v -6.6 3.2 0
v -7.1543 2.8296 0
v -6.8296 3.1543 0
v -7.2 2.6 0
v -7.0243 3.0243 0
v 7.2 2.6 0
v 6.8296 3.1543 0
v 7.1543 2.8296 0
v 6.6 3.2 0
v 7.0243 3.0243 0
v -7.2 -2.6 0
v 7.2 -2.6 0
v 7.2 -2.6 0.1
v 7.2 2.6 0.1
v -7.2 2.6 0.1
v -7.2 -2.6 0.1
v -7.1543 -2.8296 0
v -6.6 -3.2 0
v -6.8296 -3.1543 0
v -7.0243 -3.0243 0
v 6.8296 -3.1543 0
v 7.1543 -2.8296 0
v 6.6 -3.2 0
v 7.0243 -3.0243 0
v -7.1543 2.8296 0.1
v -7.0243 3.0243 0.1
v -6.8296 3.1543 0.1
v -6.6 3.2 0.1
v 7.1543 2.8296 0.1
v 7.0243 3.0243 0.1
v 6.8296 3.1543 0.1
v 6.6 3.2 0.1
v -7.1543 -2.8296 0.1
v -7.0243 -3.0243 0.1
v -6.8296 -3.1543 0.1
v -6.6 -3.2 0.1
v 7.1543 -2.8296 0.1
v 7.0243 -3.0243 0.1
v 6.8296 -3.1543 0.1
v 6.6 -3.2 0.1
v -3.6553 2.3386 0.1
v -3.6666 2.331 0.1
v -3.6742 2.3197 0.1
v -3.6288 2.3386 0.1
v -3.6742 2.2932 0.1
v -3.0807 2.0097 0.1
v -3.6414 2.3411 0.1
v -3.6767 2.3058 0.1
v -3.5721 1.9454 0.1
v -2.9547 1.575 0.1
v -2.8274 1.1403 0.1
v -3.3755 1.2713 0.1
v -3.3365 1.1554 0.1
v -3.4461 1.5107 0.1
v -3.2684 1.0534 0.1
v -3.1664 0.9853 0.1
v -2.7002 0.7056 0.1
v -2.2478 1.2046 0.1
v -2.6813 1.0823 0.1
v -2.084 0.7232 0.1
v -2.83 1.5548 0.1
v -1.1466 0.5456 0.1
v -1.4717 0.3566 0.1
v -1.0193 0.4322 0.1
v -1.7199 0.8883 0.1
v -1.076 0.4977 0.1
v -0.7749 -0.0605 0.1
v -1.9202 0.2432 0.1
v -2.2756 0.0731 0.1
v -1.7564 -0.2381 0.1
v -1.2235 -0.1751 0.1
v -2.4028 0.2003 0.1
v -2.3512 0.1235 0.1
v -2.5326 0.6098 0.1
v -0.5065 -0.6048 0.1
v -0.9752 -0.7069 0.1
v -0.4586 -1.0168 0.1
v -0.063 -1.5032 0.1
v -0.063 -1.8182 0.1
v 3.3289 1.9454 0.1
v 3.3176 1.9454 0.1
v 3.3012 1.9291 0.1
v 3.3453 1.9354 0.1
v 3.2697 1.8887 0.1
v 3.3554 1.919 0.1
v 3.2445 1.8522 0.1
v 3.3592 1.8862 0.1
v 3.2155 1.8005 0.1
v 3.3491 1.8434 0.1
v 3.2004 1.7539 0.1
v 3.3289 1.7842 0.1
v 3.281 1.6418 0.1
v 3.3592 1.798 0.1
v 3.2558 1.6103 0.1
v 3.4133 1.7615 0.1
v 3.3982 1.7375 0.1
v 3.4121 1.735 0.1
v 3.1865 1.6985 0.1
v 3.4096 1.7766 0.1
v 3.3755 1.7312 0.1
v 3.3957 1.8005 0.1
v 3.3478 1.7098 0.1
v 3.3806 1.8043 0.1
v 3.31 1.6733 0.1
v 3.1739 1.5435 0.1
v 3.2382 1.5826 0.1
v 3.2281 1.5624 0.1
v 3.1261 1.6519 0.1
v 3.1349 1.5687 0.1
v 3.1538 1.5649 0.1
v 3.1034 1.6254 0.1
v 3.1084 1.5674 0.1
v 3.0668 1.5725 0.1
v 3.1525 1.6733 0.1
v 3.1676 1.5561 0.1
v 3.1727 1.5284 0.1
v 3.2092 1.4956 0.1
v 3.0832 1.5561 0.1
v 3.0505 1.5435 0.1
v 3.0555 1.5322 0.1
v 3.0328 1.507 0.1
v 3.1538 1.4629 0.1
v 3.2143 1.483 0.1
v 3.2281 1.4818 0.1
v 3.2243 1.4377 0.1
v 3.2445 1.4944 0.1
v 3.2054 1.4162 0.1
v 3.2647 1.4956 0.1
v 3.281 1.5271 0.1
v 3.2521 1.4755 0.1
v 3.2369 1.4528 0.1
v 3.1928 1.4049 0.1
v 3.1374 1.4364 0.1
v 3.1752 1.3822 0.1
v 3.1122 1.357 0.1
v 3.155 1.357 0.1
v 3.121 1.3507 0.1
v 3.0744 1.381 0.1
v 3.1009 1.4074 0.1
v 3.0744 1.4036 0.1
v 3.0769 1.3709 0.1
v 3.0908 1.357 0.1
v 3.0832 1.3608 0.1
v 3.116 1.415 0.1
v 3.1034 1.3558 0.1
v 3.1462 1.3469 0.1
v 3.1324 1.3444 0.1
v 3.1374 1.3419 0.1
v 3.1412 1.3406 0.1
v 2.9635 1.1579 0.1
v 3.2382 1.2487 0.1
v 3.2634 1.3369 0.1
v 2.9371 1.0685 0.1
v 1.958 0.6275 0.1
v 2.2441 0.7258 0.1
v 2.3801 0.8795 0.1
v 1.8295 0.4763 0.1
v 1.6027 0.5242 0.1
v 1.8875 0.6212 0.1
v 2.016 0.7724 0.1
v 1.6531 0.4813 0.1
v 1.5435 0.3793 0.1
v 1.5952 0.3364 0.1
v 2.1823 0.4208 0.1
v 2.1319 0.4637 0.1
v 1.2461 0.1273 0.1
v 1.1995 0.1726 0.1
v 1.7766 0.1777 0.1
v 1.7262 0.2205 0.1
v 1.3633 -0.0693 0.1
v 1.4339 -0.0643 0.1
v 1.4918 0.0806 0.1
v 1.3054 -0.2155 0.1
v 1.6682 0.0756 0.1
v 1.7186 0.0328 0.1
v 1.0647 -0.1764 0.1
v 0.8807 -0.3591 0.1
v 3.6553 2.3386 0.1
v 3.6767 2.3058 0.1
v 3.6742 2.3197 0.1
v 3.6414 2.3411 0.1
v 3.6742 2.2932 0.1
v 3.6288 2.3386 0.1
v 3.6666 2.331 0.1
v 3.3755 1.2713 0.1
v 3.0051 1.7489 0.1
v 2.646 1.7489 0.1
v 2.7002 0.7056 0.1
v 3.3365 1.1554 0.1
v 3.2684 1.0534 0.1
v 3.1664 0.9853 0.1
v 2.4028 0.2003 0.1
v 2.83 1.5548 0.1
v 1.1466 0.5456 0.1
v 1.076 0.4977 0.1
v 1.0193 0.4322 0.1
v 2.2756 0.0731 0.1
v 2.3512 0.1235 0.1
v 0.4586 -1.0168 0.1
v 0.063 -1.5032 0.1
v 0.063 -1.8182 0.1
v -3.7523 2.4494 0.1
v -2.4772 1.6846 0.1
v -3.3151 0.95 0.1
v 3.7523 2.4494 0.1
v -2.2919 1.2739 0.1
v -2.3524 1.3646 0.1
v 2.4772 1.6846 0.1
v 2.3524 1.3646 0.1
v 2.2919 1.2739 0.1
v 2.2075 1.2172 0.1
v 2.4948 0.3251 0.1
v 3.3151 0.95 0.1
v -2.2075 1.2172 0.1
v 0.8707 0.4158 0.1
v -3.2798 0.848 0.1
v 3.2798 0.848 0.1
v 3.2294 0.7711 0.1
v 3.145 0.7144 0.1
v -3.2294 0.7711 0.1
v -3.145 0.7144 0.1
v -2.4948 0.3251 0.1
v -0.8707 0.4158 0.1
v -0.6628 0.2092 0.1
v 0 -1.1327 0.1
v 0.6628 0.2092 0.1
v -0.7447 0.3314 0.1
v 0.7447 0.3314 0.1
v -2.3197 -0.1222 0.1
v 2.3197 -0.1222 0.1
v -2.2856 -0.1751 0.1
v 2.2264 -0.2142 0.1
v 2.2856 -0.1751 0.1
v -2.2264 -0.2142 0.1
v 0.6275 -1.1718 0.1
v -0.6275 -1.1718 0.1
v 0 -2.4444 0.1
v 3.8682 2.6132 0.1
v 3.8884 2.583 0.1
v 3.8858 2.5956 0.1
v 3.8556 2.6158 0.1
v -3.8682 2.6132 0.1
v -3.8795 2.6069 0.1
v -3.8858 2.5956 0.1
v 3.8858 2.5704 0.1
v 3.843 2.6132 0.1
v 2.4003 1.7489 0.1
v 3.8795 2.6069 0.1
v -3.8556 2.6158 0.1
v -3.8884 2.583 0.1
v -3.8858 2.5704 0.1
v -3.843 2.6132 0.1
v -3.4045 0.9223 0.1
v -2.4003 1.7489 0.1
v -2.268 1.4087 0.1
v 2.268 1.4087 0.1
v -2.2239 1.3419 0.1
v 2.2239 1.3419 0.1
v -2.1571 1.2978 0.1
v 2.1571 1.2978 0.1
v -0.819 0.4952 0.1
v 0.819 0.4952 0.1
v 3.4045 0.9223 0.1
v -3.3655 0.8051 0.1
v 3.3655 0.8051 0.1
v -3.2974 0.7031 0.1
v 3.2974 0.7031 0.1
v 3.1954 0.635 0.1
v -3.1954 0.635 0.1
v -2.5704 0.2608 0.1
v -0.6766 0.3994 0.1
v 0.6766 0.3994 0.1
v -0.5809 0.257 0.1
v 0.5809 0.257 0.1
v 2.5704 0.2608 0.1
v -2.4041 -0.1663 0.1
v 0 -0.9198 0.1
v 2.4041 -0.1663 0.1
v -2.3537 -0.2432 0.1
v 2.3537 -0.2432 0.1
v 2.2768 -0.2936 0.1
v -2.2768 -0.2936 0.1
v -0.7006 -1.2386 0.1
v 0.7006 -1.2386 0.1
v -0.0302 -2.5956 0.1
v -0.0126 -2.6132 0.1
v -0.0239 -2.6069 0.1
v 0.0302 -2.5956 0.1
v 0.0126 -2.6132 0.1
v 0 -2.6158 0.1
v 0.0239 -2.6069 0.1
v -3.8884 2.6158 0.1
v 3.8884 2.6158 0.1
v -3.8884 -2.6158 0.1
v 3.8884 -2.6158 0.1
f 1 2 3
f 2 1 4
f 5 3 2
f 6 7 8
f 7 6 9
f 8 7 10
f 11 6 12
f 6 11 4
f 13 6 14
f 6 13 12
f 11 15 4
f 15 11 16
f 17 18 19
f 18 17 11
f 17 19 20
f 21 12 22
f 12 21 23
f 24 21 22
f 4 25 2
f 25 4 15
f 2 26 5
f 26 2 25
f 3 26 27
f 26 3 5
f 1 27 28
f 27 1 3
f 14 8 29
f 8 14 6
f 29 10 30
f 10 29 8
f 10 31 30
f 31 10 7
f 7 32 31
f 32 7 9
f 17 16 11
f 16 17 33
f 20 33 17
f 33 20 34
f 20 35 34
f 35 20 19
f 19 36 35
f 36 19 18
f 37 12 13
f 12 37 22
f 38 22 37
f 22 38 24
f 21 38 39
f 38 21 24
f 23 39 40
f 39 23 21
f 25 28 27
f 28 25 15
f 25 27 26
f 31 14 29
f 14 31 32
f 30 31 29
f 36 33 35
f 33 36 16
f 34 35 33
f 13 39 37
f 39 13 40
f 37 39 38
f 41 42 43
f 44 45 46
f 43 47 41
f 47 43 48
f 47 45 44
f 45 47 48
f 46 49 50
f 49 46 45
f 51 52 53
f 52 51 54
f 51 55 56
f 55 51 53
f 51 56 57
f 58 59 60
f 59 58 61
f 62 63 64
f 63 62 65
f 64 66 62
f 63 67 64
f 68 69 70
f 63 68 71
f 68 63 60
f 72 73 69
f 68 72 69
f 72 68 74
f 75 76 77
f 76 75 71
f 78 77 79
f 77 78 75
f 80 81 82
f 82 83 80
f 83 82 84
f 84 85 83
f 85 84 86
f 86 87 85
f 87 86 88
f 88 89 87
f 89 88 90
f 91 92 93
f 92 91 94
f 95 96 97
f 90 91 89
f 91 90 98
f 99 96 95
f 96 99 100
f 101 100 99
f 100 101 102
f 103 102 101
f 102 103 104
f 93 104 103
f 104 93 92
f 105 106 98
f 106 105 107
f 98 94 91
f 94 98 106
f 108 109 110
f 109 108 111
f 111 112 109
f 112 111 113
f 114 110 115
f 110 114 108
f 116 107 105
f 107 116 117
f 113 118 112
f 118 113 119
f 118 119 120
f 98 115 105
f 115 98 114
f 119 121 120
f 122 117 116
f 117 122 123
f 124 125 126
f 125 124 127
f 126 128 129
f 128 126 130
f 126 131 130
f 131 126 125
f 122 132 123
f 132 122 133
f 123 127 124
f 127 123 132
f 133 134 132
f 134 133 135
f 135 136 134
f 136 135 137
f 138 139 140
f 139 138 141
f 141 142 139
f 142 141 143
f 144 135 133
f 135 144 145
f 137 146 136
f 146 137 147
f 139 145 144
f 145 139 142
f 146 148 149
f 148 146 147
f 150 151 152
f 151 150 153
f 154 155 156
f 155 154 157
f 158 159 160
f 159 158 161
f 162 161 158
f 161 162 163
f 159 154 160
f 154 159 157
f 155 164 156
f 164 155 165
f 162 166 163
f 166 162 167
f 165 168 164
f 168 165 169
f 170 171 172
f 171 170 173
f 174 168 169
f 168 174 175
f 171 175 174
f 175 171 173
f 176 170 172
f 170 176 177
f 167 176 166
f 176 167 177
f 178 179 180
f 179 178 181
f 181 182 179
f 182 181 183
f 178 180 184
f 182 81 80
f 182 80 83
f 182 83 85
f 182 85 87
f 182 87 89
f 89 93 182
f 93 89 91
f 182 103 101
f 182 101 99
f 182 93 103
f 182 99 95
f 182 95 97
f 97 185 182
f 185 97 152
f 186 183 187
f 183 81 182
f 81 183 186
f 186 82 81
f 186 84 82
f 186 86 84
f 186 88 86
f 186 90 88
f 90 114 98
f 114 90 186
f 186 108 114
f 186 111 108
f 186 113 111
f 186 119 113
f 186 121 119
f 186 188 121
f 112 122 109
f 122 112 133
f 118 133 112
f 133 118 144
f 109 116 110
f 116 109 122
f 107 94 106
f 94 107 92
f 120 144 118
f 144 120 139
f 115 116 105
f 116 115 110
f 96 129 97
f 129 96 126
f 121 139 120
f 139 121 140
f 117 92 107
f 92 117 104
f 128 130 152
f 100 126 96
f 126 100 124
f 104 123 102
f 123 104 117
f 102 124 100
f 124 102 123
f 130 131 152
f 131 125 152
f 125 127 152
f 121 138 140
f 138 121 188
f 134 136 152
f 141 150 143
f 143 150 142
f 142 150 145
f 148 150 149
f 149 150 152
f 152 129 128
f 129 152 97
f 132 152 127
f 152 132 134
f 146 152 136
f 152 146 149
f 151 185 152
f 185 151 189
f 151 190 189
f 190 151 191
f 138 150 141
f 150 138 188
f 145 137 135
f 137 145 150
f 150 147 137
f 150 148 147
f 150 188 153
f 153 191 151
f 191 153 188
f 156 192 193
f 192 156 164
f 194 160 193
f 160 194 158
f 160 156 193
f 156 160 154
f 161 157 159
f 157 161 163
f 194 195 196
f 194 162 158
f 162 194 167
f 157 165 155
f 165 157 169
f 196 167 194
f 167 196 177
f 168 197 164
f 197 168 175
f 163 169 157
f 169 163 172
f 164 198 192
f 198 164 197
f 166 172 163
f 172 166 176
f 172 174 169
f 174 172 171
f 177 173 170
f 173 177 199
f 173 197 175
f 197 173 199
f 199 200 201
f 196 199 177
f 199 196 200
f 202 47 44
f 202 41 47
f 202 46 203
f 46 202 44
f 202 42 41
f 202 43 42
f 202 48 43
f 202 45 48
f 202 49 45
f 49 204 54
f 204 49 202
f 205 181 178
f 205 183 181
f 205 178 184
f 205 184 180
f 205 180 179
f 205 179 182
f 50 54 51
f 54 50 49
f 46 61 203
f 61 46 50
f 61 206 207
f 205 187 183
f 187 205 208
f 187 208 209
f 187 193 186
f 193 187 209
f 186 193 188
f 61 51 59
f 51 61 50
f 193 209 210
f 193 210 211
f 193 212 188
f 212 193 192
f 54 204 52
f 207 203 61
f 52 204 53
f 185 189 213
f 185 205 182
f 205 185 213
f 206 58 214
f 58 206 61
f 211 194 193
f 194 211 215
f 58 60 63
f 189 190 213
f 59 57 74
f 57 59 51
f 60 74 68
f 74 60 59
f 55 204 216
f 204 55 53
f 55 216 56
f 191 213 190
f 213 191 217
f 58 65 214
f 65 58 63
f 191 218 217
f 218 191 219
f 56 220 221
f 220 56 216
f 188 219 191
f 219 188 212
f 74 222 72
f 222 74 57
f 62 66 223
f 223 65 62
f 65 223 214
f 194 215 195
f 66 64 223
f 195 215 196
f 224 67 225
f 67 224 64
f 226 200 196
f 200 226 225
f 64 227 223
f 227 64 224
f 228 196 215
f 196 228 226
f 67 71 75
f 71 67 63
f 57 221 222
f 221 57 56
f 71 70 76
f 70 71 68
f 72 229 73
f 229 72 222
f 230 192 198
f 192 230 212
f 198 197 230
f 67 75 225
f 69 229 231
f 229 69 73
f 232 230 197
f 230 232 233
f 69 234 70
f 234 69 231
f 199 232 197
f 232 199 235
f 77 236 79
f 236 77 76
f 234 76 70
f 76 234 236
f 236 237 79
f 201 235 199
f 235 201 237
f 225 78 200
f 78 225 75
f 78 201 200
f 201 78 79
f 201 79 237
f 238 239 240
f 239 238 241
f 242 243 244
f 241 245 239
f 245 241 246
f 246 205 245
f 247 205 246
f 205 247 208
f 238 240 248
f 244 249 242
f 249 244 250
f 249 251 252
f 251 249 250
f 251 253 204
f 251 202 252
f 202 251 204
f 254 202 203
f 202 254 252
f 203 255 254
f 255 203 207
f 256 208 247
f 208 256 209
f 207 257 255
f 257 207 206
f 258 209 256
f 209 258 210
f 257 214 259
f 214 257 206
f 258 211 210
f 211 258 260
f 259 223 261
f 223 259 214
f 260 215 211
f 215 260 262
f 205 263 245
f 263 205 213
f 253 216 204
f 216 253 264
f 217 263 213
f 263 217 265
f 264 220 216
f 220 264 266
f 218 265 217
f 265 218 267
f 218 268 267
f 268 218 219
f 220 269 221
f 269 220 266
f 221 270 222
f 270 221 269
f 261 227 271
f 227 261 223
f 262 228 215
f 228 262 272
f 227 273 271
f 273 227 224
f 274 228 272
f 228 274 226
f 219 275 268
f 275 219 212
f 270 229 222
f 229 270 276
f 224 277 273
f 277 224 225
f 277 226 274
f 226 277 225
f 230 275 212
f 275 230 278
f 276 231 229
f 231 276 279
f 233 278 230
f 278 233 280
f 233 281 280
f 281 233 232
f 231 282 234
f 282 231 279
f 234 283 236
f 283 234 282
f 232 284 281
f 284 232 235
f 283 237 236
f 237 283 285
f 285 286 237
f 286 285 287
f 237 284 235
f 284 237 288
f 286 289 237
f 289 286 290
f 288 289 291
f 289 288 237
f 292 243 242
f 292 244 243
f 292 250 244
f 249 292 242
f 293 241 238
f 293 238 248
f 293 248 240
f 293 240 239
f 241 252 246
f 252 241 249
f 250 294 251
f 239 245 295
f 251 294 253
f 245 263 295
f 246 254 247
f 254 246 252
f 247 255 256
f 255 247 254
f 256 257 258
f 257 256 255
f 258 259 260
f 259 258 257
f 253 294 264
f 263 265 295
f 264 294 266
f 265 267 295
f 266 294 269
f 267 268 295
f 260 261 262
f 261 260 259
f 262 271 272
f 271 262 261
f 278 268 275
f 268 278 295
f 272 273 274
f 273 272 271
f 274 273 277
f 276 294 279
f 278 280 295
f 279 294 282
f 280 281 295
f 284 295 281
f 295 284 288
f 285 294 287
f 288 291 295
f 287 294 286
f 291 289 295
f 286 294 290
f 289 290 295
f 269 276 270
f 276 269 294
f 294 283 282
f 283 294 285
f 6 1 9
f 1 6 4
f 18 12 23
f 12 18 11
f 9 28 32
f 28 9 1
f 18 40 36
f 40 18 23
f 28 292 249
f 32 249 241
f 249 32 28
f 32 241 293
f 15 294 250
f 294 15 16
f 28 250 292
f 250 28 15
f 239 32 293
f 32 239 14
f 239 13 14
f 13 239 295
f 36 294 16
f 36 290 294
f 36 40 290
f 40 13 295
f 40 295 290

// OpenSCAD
// file: ../p/box3u12.scad
use <../lib.scad>
function ldraw_lib__box3u12() = [
// 0 Box with 3 Parallel Faces without Any Edges
// 0 Name: box3u12.dat
// 0 Author: J.C. Tchang [tchang]
// 0 !LDRAW_ORG Primitive UPDATE 2014-02
// 0 !LICENSE Licensed under CC BY 4.0 : see CAreadme.txt
// 
// 0 BFC CERTIFY CCW
  [0,"BFC","CERTIFY"],
  [0,"BFC","CCW"],
// 
// 0 !HISTORY 2014-12-23 [PTadmin] Official Update 2014-02
// 
// 
// 4 16 -1 1 1 1 1 1 1 1 -1 -1 1 -1
  [4,16,-1,1,1,1,1,1,1,1,-1,-1,1,-1],
// 4 16 -1 1 1 -1 0 1 1 0 1 1 1 1
  [4,16,-1,1,1,-1,0,1,1,0,1,1,1,1],
// 4 16 1 1 -1 1 0 -1 -1 0 -1 -1 1 -1
  [4,16,1,1,-1,1,0,-1,-1,0,-1,-1,1,-1],
];
module ldraw_lib__box3u12(step=0, col=false, unit=2/5, alt=false, line=0.2, solid=!$preview)
    makepoly(ldraw_lib__box3u12(), step=step, col=col, unit=unit, alt=alt, line=line, solid=solid);
ldraw_lib__box3u12(line=0.2);
// file: ../p/1-4cyli.scad
use <../lib.scad>
function ldraw_lib__1_4cyli() = [
// 0 Cylinder 0.25
// 0 Name: 1-4cyli.dat
// 0 Author: James Jessiman
// 0 !LDRAW_ORG Primitive UPDATE 2012-01
// 0 !LICENSE Licensed under CC BY 4.0 : see CAreadme.txt
// 
// 0 BFC CERTIFY CCW
  [0,"BFC","CERTIFY"],
  [0,"BFC","CCW"],
// 
// 0 !HISTORY 2002-03-23 [sbliss] Added BFC statement.
// 0 !HISTORY 2002-04-25 [PTadmin] Official Update 2002-02
// 0 !HISTORY 2007-06-22 [PTadmin] Header formatted for Contributor Agreement
// 0 !HISTORY 2008-07-01 [PTadmin] Official Update 2008-01
// 0 !HISTORY 2012-02-16 [Philo] Changed to CCW
// 0 !HISTORY 2012-03-30 [PTadmin] Official Update 2012-01
// 
// 
// 4 16 1 1 0 0.9239 1 0.3827 0.9239 0 0.3827 1 0 0
  [4,16,1,1,0,0.9239,1,0.3827,0.9239,0,0.3827,1,0,0],
// 5 24 1 0 0 1 1 0 0.9239 0 0.3827 1 0 -1
  [5,24,1,0,0,1,1,0,0.9239,0,0.3827,1,0,-1],
// 4 16 0.9239 1 0.3827 0.7071 1 0.7071 0.7071 0 0.7071 0.9239 0 0.3827
  [4,16,0.9239,1,0.3827,0.7071,1,0.7071,0.7071,0,0.7071,0.9239,0,0.3827],
// 5 24 0.9239 0 0.3827 0.9239 1 0.3827 0.7071 0 0.7071 1 0 0
  [5,24,0.9239,0,0.3827,0.9239,1,0.3827,0.7071,0,0.7071,1,0,0],
// 4 16 0.7071 1 0.7071 0.3827 1 0.9239 0.3827 0 0.9239 0.7071 0 0.7071
  [4,16,0.7071,1,0.7071,0.3827,1,0.9239,0.3827,0,0.9239,0.7071,0,0.7071],
// 5 24 0.7071 0 0.7071 0.7071 1 0.7071 0.3827 0 0.9239 0.9239 0 0.3827
  [5,24,0.7071,0,0.7071,0.7071,1,0.7071,0.3827,0,0.9239,0.9239,0,0.3827],
// 4 16 0.3827 1 0.9239 0 1 1 0 0 1 0.3827 0 0.9239
  [4,16,0.3827,1,0.9239,0,1,1,0,0,1,0.3827,0,0.9239],
// 5 24 0.3827 0 0.9239 0.3827 1 0.9239 0 0 1 0.7071 0 0.7071
  [5,24,0.3827,0,0.9239,0.3827,1,0.9239,0,0,1,0.7071,0,0.7071],
// 5 24 0 0 1 0 1 1 0.3827 0 0.9239 -1 0 1
  [5,24,0,0,1,0,1,1,0.3827,0,0.9239,-1,0,1],
];
module ldraw_lib__1_4cyli(step=0, col=false, unit=2/5, alt=false, line=0.2, solid=!$preview)
    makepoly(ldraw_lib__1_4cyli(), step=step, col=col, unit=unit, alt=alt, line=line, solid=solid);
ldraw_lib__1_4cyli(line=0.2);
// file: ../p/1-4chrd.scad
use <../lib.scad>
function ldraw_lib__1_4chrd() = [
// 0 Chord 0.25
// 0 Name: 1-4chrd.dat
// 0 Author: Tony Hafner [hafhead]
// 0 !LDRAW_ORG Primitive UPDATE 2012-02
// 0 !LICENSE Licensed under CC BY 2.0 and CC BY 4.0 : see CAreadme.txt
// 
// 0 BFC CERTIFY CCW
  [0,"BFC","CERTIFY"],
  [0,"BFC","CCW"],
// 
// 0 !HISTORY 2004-04-22 [PTadmin] Official Update 2004-02
// 0 !HISTORY 2007-10-09 [PTadmin] Header formatted for Contributor Agreement
// 0 !HISTORY 2008-07-01 [PTadmin] Official Update 2008-01
// 0 !HISTORY 2012-08-02 [MMR1988] Re-creation with PrimGen2 and Rectifier
// 0 !HISTORY 2012-08-09 [PTadmin] Official Update 2012-02
// 
// 
// 4 16 0.9239 0 0.3827 0.3827 0 0.9239 0 0 1 1 0 0
  [4,16,0.9239,0,0.3827,0.3827,0,0.9239,0,0,1,1,0,0],
// 3 16 0.7071 0 0.7071 0.3827 0 0.9239 0.9239 0 0.3827
  [3,16,0.7071,0,0.7071,0.3827,0,0.9239,0.9239,0,0.3827],
];
module ldraw_lib__1_4chrd(step=0, col=false, unit=2/5, alt=false, line=0.2, solid=!$preview)
    makepoly(ldraw_lib__1_4chrd(), step=step, col=col, unit=unit, alt=alt, line=line, solid=solid);
ldraw_lib__1_4chrd(line=0.2);
// main file
use <../lib.scad>
use <../p/1-4chrd.scad>
use <../p/1-4cyli.scad>
use <../p/box3u12.scad>
use <s/logochevl02.scad>
function ldraw_lib__6142622e() = [
// 0 Sticker  0.8 x  1.8 with Chevrolet Corvette Z06-C7 Logo on Yellow Background
// 0 Name: 6142622e.dat
// 0 Author: Massimo Maso [Sirio]
// 0 !LDRAW_ORG Part UPDATE 2022-03
// 0 !LICENSE Licensed under CC BY 4.0 : see CAreadme.txt
// 
// 0 BFC CERTIFY CCW
  [0,"BFC","CERTIFY"],
  [0,"BFC","CCW"],
// 
// 0 !KEYWORDS Set 75870, Speed Champions
// 
// 0 !HISTORY 2022-05-07 [PTadmin] Official Update 2022-03
// 
// 
// 0 // Primitives
// 1 16 -16.5 0 6.5 -1.5 0 0 0 -1 0 0 0 1.5 1-4chrd.dat
  [1,16,-16.5,0,6.5,-1.5,0,0,0,-1,0,0,0,1.5, ldraw_lib__1_4chrd()],
// 1 16 16.5 0 6.5 1.5 0 0 0 -1 0 0 0 1.5 1-4chrd.dat
  [1,16,16.5,0,6.5,1.5,0,0,0,-1,0,0,0,1.5, ldraw_lib__1_4chrd()],
// 1 16 0 -.25 0 0 0 18 0 .25 0 -6.5 0 0 box3u12.dat
  [1,16,0,-.25,0,0,0,18,0,.25,0,-6.5,0,0, ldraw_lib__box3u12()],
// 1 16 -16.5 0 -6.5 -1.5 0 0 0 -1 0 0 0 -1.5 1-4chrd.dat
  [1,16,-16.5,0,-6.5,-1.5,0,0,0,-1,0,0,0,-1.5, ldraw_lib__1_4chrd()],
// 1 16 16.5 0 -6.5 1.5 0 0 0 -1 0 0 0 -1.5 1-4chrd.dat
  [1,16,16.5,0,-6.5,1.5,0,0,0,-1,0,0,0,-1.5, ldraw_lib__1_4chrd()],
// 1 16 -16.5 0 6.5 -1.5 0 0 0 -.25 0 0 0 1.5 1-4cyli.dat
  [1,16,-16.5,0,6.5,-1.5,0,0,0,-.25,0,0,0,1.5, ldraw_lib__1_4cyli()],
// 1 16 16.5 0 6.5 1.5 0 0 0 -.25 0 0 0 1.5 1-4cyli.dat
  [1,16,16.5,0,6.5,1.5,0,0,0,-.25,0,0,0,1.5, ldraw_lib__1_4cyli()],
// 1 16 -16.5 0 -6.5 -1.5 0 0 0 -.25 0 0 0 -1.5 1-4cyli.dat
  [1,16,-16.5,0,-6.5,-1.5,0,0,0,-.25,0,0,0,-1.5, ldraw_lib__1_4cyli()],
// 1 16 16.5 0 -6.5 1.5 0 0 0 -.25 0 0 0 -1.5 1-4cyli.dat
  [1,16,16.5,0,-6.5,1.5,0,0,0,-.25,0,0,0,-1.5, ldraw_lib__1_4cyli()],
// 1 14 -16.5 -.25 6.5 -1.5 0 0 0 1 0 0 0 1.5 1-4chrd.dat
  [1,14,-16.5,-.25,6.5,-1.5,0,0,0,1,0,0,0,1.5, ldraw_lib__1_4chrd()],
// 1 14 16.5 -.25 6.5 1.5 0 0 0 1 0 0 0 1.5 1-4chrd.dat
  [1,14,16.5,-.25,6.5,1.5,0,0,0,1,0,0,0,1.5, ldraw_lib__1_4chrd()],
// 1 14 -16.5 -.25 -6.5 -1.5 0 0 0 1 0 0 0 -1.5 1-4chrd.dat
  [1,14,-16.5,-.25,-6.5,-1.5,0,0,0,1,0,0,0,-1.5, ldraw_lib__1_4chrd()],
// 1 14 16.5 -.25 -6.5 1.5 0 0 0 1 0 0 0 -1.5 1-4chrd.dat
  [1,14,16.5,-.25,-6.5,1.5,0,0,0,1,0,0,0,-1.5, ldraw_lib__1_4chrd()],
// 1 14 0 -0.25 0 3.15 0 0 0 1 0 0 0 3.15 s\logochevl02.dat
  [1,14,0,-0.25,0,3.15,0,0,0,1,0,0,0,3.15, ldraw_lib__s__logochevl02()],
// 0 // Bottom face
// 4 16 16.5 0 8 18 0 6.5 -18 0 6.5 -16.5 0 8
  [4,16,16.5,0,8,18,0,6.5,-18,0,6.5,-16.5,0,8],
// 4 16 -18 0 -6.5 18 0 -6.5 16.5 0 -8 -16.5 0 -8
  [4,16,-18,0,-6.5,18,0,-6.5,16.5,0,-8,-16.5,0,-8],
// 0 // Lateral faces
// 4 16 -16.5 0 8 -16.5 -0.25 8 16.5 -0.25 8 16.5 0 8
  [4,16,-16.5,0,8,-16.5,-0.25,8,16.5,-0.25,8,16.5,0,8],
// 4 16 16.5 0 -8 16.5 -0.25 -8 -16.5 -0.25 -8 -16.5 0 -8
  [4,16,16.5,0,-8,16.5,-0.25,-8,-16.5,-0.25,-8,-16.5,0,-8],
// 0 // Top face
// 3 14 -16.5 -.25 8 -9.7209 -.25 6.5394 -9.639 -.25 6.5394
  [3,14,-16.5,-.25,8,-9.7209,-.25,6.5394,-9.639,-.25,6.5394],
// 4 14 -16.5 -.25 8 -9.639 -.25 6.5394 9.639 -.25 6.5394 16.5 -.25 8
  [4,14,-16.5,-.25,8,-9.639,-.25,6.5394,9.639,-.25,6.5394,16.5,-.25,8],
// 3 14 16.5 -.25 8 9.639 -.25 6.5394 9.7209 -.25 6.5394
  [3,14,16.5,-.25,8,9.639,-.25,6.5394,9.7209,-.25,6.5394],
// 4 14 -18 -.25 6.5 -18 -.25 -6.5 -9.7209 -.25 -6.5394 -9.7209 -.25 6.4575
  [4,14,-18,-.25,6.5,-18,-.25,-6.5,-9.7209,-.25,-6.5394,-9.7209,-.25,6.4575],
// 4 14 -18 -.25 6.5 -9.7209 -.25 6.4575 -9.7209 -.25 6.5394 -16.5 -.25 8
  [4,14,-18,-.25,6.5,-9.7209,-.25,6.4575,-9.7209,-.25,6.5394,-16.5,-.25,8],
// 4 14 18 -.25 6.5 16.5 -.25 8 9.7209 -.25 6.5394 9.7209 -.25 6.4575
  [4,14,18,-.25,6.5,16.5,-.25,8,9.7209,-.25,6.5394,9.7209,-.25,6.4575],
// 4 14 18 -.25 6.5 9.7209 -.25 6.4575 9.7209 -.25 -6.5394 18 -.25 -6.5
  [4,14,18,-.25,6.5,9.7209,-.25,6.4575,9.7209,-.25,-6.5394,18,-.25,-6.5],
// 3 14 -16.5 -.25 -8 -9.7209 -.25 -6.5394 -18 -.25 -6.5
  [3,14,-16.5,-.25,-8,-9.7209,-.25,-6.5394,-18,-.25,-6.5],
// 3 14 -16.5 -.25 -8 0 -.25 -6.5394 -9.7209 -.25 -6.5394
  [3,14,-16.5,-.25,-8,0,-.25,-6.5394,-9.7209,-.25,-6.5394],
// 3 14 -16.5 -.25 -8 16.5 -.25 -8 0 -.25 -6.5394
  [3,14,-16.5,-.25,-8,16.5,-.25,-8,0,-.25,-6.5394],
// 3 14 16.5 -.25 -8 18 -.25 -6.5 9.7209 -.25 -6.5394
  [3,14,16.5,-.25,-8,18,-.25,-6.5,9.7209,-.25,-6.5394],
// 3 14 16.5 -.25 -8 9.7209 -.25 -6.5394 0 -.25 -6.5394
  [3,14,16.5,-.25,-8,9.7209,-.25,-6.5394,0,-.25,-6.5394],
];
module ldraw_lib__6142622e(step=0, col=false, unit=2/5, alt=false, line=0.2, solid=!$preview)
    makepoly(ldraw_lib__6142622e(), step=step, col=col, unit=unit, alt=alt, line=line, solid=solid);
ldraw_lib__6142622e(line=0.2);
